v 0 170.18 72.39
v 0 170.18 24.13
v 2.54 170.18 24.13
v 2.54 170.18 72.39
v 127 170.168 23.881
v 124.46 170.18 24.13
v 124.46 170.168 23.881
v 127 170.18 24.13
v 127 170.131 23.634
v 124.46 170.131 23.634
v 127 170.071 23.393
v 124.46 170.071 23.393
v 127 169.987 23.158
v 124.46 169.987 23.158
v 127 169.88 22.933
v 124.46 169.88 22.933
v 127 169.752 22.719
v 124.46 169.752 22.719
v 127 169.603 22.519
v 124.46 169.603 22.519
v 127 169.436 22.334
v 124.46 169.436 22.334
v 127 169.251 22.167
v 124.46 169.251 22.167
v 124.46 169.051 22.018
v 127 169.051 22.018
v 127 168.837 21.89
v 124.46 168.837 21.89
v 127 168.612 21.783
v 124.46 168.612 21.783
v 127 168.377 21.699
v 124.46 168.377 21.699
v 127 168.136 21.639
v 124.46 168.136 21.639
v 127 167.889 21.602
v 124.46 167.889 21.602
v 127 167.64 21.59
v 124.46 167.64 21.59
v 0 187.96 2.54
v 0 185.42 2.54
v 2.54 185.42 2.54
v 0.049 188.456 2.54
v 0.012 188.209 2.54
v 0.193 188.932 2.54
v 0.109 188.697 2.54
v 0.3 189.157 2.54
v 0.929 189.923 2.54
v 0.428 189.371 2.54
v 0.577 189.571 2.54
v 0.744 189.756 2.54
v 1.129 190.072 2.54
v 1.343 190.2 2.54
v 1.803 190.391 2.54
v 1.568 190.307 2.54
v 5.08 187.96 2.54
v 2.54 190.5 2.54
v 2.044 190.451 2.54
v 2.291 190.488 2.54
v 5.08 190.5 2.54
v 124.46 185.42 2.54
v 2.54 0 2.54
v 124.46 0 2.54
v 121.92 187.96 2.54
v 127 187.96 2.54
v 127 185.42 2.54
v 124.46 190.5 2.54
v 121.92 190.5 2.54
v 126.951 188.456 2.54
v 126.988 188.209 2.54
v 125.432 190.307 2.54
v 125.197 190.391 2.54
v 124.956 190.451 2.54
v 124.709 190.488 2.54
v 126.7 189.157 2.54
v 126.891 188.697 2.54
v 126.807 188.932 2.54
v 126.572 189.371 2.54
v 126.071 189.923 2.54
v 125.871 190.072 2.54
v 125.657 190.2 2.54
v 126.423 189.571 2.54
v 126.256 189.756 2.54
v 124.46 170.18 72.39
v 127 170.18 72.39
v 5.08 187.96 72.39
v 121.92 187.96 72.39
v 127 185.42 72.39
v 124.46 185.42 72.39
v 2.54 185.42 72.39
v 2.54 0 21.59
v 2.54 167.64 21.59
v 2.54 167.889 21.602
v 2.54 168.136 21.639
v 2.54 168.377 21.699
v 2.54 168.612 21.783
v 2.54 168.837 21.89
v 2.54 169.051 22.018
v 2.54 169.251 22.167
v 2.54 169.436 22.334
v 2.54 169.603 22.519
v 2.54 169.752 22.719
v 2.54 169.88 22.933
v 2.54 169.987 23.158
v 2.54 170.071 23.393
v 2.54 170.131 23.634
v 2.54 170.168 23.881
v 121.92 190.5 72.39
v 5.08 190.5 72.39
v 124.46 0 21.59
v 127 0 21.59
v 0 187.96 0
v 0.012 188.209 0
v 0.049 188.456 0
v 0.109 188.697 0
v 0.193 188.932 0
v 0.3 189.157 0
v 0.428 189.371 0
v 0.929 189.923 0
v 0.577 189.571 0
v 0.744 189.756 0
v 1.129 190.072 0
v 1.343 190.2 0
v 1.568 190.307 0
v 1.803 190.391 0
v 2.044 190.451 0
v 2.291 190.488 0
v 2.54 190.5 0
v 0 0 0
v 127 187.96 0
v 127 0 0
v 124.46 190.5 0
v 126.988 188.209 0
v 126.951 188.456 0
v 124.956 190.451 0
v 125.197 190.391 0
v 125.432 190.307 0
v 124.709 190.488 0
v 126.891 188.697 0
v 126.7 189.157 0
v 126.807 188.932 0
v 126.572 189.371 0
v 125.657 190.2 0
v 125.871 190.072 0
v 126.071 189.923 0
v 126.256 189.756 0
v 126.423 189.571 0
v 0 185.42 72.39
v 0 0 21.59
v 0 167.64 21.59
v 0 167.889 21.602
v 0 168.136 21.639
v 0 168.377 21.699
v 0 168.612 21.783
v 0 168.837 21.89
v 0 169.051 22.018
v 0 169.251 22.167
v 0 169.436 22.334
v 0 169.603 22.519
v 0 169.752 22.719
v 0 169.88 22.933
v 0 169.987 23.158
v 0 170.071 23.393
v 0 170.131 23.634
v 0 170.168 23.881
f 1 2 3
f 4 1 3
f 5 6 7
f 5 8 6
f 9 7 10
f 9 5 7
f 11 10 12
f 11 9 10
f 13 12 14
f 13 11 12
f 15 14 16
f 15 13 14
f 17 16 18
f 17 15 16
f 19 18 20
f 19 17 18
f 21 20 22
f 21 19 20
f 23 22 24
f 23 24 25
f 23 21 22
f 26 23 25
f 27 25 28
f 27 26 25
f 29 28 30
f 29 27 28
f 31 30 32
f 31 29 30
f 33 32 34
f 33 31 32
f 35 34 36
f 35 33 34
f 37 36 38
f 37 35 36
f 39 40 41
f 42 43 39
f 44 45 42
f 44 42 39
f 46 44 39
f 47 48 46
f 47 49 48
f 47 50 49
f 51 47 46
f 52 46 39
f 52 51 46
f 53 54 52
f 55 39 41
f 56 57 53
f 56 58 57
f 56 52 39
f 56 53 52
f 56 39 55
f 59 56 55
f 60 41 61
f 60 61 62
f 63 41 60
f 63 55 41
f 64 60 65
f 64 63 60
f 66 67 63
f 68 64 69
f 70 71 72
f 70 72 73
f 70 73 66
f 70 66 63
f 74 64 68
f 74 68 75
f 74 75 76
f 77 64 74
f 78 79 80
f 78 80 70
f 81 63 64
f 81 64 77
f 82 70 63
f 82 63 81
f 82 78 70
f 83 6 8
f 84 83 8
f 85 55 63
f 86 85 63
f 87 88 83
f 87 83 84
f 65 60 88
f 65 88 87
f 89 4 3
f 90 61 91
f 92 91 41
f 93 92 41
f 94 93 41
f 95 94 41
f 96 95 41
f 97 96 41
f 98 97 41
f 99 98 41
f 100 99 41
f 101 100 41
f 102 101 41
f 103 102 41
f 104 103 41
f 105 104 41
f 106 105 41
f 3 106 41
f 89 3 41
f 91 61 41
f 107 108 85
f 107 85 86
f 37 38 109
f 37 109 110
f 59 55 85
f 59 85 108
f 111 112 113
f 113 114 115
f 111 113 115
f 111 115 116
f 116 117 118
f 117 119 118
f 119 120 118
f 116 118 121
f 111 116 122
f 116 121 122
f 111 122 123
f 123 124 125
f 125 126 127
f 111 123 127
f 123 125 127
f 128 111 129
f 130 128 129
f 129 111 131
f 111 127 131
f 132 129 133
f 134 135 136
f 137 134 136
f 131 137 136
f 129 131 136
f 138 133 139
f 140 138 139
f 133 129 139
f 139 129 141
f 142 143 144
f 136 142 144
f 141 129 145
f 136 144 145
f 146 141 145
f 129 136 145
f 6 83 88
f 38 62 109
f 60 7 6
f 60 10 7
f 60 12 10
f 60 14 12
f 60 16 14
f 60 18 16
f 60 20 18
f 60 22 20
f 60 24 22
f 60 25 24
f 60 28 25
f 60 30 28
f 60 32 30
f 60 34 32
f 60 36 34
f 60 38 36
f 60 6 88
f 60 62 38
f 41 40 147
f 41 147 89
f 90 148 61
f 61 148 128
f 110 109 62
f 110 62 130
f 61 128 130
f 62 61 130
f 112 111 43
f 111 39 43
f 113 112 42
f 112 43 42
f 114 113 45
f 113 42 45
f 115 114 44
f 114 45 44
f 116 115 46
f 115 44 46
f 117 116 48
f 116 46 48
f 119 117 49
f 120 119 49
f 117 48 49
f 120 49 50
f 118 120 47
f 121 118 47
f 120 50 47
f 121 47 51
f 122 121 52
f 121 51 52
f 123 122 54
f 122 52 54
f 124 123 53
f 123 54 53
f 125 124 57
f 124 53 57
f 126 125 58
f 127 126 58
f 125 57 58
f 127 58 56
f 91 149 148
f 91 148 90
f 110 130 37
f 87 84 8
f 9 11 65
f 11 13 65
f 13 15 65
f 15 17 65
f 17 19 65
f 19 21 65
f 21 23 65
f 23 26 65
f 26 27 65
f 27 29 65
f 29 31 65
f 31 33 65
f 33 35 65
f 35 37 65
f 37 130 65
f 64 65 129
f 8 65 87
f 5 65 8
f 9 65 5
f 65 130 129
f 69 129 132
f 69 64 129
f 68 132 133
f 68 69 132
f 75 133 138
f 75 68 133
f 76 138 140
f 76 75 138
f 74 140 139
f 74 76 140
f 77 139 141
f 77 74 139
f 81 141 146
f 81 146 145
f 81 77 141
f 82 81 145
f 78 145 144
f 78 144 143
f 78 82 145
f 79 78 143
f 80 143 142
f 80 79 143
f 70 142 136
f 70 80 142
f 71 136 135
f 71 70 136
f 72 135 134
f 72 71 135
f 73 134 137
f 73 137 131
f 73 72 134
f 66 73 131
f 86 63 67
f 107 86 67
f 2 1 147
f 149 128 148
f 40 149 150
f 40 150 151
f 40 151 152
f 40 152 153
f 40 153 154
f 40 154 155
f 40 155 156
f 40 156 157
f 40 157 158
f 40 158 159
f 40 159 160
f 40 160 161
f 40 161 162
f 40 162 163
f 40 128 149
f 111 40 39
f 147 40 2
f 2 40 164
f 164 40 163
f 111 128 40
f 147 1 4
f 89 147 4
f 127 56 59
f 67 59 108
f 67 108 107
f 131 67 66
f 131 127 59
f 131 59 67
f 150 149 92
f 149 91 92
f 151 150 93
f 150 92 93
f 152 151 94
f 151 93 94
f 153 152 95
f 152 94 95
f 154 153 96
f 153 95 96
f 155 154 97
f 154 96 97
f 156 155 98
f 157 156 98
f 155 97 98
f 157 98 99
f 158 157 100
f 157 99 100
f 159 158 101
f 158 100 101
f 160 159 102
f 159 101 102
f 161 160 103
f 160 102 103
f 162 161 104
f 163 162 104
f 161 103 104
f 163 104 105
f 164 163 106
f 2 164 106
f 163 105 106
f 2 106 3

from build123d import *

# Parameters (mm, degrees)
SKETCH1_W           = 127
SKETCH1_H           = 190.5
BOSS_EXTRUDE1_DEPTH = 2.54
SKETCH3_W           = 2.54
SKETCH3_H           = 185.42
SKETCH3_W_2         = 116.84
SKETCH3_H_2         = 2.54
BOSS_EXTRUDE2_DEPTH = 19.05
SKETCH4_W           = 2.54
SKETCH4_H           = 15.24
SKETCH4_W_2         = 116.84
SKETCH4_H_2         = 2.54
BOSS_EXTRUDE3_DEPTH = 50.8
FILLET2_R           = 2.54


with BuildPart() as part:
    # Sketch1 → Boss-Extrude1 (new body)
    with BuildSketch(Plane.XY):
        with Locations((63.5, 95.25)):
            Rectangle(SKETCH1_W, SKETCH1_H)
    extrude(amount=BOSS_EXTRUDE1_DEPTH)

    # Sketch3 → Boss-Extrude2 (add)
    with BuildSketch(Plane.XY.offset(2.54)):
        with Locations((1.27, 92.71)):
            Rectangle(SKETCH3_W, SKETCH3_H)
        with Locations((63.5, 189.23)):
            Rectangle(SKETCH3_W_2, SKETCH3_H_2)
        with Locations((125.73, 92.71)):
            Rectangle(SKETCH3_W, SKETCH3_H)
    extrude(amount=BOSS_EXTRUDE2_DEPTH)

    # Sketch4 → Boss-Extrude3 (add)
    with BuildSketch(Plane.XY.offset(21.59)):
        with Locations((1.27, 177.8)):
            Rectangle(SKETCH4_W, SKETCH4_H)
        with Locations((63.5, 189.23)):
            Rectangle(SKETCH4_W_2, SKETCH4_H_2)
        with Locations((125.73, 177.8)):
            Rectangle(SKETCH4_W, SKETCH4_H)
    extrude(amount=BOSS_EXTRUDE3_DEPTH)

    # Fillet2
    fillet2_edges = [part.edges().sort_by_distance(p)[0] for p in [
        (1.27, 170.18, 21.59),
        (0, 190.5, 1.27),
        (125.73, 170.18, 21.59),
        (127, 190.5, 1.27),
    ]]
    fillet(fillet2_edges, radius=FILLET2_R)


solid = part.part
